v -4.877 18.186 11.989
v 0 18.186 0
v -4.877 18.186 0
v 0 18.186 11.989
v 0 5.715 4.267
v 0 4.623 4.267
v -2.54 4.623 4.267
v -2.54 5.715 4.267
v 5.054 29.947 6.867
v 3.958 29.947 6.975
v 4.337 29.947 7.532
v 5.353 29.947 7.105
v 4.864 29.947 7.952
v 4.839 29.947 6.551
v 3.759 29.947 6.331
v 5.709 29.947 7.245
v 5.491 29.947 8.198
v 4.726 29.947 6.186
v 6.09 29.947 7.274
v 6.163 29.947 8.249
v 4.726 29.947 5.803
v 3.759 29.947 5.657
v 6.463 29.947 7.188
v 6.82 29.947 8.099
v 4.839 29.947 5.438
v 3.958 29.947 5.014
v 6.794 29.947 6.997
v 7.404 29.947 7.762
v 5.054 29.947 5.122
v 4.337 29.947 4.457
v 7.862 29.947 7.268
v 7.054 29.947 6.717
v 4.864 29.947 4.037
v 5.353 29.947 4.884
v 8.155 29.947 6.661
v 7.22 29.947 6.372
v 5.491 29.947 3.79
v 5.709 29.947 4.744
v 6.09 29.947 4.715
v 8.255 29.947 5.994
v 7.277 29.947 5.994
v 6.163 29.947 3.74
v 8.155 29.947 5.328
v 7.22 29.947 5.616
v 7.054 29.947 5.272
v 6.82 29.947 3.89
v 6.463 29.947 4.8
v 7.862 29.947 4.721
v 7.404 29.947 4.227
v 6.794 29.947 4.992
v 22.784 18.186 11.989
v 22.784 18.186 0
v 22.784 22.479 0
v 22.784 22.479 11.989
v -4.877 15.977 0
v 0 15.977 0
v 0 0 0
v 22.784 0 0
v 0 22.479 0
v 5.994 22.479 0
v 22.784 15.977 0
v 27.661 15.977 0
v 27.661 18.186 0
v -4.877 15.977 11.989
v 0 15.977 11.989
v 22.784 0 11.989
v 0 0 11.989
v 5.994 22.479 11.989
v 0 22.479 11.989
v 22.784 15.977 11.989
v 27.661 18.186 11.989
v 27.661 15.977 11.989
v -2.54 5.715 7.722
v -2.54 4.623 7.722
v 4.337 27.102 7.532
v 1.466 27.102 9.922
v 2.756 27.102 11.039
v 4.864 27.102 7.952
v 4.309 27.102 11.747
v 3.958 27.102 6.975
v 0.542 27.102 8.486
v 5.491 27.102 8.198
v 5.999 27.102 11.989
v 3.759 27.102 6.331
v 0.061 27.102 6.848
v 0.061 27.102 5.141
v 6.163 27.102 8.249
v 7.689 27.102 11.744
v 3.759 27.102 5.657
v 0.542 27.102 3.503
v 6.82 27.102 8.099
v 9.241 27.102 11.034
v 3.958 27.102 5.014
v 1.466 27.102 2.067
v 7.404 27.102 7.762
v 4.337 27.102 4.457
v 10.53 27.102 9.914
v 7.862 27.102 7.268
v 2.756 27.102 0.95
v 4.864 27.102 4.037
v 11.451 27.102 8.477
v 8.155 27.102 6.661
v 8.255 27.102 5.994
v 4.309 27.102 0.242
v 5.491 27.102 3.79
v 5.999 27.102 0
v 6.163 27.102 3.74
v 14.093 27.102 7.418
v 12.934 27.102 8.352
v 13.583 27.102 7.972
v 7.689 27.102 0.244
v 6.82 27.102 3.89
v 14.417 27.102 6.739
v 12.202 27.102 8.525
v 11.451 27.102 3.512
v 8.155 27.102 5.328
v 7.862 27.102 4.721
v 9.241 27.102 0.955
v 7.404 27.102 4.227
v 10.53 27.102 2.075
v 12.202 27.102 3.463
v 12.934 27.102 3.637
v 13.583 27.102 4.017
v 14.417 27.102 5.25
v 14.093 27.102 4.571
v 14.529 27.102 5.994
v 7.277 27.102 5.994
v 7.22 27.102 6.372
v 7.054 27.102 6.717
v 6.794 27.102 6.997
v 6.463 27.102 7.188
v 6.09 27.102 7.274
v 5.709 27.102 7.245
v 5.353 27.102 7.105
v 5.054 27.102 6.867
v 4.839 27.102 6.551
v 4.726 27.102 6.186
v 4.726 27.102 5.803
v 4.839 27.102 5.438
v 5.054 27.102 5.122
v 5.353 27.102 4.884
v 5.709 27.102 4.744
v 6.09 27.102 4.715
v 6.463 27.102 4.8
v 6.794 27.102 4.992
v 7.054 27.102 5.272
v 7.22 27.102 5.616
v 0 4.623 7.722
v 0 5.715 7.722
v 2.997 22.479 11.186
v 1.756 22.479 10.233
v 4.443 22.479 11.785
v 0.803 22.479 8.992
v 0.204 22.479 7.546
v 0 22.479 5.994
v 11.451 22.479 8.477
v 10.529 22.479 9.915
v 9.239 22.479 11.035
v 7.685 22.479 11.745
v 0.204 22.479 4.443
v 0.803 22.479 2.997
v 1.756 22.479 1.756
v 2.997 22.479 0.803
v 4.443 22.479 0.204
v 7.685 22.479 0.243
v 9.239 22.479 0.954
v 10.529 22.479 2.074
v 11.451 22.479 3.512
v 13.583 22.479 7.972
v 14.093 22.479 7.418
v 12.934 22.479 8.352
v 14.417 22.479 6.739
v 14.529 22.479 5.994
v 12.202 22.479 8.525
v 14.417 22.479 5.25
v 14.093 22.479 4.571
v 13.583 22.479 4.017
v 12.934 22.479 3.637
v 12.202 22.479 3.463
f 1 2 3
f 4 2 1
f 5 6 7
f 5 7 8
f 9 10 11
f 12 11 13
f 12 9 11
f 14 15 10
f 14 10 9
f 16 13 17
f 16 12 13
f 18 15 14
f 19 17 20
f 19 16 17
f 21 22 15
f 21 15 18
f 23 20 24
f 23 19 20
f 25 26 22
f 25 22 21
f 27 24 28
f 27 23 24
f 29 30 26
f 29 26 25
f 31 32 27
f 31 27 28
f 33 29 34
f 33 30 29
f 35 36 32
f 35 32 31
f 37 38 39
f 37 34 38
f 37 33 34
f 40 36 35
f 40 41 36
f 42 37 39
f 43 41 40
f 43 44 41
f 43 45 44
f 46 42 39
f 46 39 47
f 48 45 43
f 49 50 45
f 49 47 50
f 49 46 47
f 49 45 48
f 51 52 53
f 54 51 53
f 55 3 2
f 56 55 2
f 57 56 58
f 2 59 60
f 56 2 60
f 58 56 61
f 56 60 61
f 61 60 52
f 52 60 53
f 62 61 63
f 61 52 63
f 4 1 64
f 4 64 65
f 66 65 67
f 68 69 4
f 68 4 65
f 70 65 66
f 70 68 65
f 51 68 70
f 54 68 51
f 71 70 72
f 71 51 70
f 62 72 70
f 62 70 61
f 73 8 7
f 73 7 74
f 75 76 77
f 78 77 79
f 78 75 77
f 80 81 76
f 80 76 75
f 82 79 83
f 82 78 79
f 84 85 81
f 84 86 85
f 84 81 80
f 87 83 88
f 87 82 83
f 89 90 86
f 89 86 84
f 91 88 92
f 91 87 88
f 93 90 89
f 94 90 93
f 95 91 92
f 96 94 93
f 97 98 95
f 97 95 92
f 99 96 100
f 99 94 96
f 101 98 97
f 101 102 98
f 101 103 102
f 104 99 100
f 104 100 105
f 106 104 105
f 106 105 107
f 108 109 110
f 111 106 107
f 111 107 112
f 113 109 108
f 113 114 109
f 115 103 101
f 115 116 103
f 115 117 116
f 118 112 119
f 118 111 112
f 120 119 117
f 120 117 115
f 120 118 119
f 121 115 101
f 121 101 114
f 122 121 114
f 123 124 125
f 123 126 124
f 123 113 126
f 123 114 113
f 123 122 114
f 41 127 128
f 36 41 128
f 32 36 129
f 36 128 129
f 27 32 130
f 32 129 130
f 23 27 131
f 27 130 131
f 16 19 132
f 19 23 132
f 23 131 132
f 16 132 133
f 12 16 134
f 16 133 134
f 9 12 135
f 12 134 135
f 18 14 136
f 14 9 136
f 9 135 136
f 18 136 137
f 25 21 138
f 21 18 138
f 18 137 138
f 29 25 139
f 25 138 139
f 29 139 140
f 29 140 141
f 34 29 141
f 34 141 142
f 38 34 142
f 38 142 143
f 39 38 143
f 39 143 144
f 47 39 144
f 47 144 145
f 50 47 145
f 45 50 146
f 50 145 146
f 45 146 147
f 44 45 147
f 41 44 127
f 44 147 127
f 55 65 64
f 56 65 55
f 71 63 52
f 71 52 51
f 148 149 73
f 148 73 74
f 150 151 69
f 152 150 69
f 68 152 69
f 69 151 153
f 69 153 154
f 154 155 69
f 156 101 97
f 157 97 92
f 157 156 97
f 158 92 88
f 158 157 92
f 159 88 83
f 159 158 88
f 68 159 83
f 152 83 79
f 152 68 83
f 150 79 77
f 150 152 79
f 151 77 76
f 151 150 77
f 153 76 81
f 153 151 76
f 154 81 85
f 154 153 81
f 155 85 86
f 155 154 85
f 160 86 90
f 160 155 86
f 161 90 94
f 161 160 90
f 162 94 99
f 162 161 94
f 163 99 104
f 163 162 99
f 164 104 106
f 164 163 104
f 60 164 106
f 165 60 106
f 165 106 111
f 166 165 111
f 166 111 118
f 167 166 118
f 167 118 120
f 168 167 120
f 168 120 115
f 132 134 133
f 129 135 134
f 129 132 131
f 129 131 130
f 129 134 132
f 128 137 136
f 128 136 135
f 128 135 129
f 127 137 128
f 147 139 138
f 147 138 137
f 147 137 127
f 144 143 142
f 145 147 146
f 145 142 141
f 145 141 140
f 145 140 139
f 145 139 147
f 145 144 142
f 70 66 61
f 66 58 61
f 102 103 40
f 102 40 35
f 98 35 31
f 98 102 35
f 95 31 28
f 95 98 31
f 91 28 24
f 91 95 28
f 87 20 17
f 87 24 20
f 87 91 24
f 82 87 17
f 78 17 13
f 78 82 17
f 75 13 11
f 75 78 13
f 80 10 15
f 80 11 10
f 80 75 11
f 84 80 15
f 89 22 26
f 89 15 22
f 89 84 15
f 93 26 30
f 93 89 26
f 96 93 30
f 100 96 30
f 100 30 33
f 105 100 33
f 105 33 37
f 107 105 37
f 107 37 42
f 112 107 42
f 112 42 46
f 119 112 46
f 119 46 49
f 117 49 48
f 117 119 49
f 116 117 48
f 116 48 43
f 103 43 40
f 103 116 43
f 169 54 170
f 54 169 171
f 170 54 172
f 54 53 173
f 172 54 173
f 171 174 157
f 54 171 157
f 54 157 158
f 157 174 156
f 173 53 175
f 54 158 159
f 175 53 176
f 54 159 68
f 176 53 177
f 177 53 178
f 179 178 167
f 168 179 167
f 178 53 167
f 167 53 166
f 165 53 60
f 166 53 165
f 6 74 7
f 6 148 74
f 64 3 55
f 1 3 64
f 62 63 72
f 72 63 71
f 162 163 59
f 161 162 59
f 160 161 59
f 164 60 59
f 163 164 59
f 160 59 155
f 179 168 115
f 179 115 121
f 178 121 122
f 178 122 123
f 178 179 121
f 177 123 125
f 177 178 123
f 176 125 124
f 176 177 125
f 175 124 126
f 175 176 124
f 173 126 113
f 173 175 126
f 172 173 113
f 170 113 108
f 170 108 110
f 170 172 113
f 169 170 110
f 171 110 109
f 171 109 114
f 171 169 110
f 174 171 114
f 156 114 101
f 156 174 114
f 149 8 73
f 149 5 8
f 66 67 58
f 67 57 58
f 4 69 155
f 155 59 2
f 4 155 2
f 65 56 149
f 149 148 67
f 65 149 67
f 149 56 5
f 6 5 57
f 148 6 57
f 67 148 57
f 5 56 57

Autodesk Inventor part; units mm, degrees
ref_plane "YZ Plane" through (0, 0, 0) normal (1, 0, 0) x (0, 1, 0)
ref_plane "XZ Plane" through (0, 0, 0) normal (0, 1, 0) x (-1, 0, 0)
ref_plane "XY Plane" through (0, 0, 0) normal (0, 0, 1) x (1, 0, 0)
sketch "Sketch1" plane through (0, 0, 0) normal (0, 0, 1) x (1, 0, 0)
  line L0 (0, 0) -> (22.7838, 0)
  line L1 (22.7838, 0) -> (22.7838, 22.479)
  line L2 (22.7838, 22.479) -> (0, 22.479)
  line L3 (0, 22.479) -> (0, 0)
  dimension "d0" = 22.7838
  dimension "d1" = 22.479
extrude "Extrusion1" add sketch "Sketch1" along normal blind 11.9888
sketch "Sketch2" plane through (0, 0, 0) normal (-1, 0, 0) x (0, 0, 1)
  line L0 (0, 22.479) -> (11.9888, 22.479) projected
  line L1 (0, 22.479) -> (0, 0) projected
  line L2 (0, 0) -> (11.9888, 0) projected
  line L3 (11.9888, 22.479) -> (11.9888, 0) projected
  line L4 (0, 22.479) -> (11.9888, 22.479) projected
  line L5 (0, 0) -> (0, 22.479) projected
  line L6 (11.9888, 0) -> (11.9888, 22.479) projected
  line L7 (0, 18.1864) -> (11.9888, 18.1864)
  line L8 (11.9888, 18.1864) -> (11.9888, 15.9766)
  line L9 (11.9888, 15.9766) -> (0, 15.9766)
  line L10 (0, 15.9766) -> (0, 18.1864)
  dimension "d4" = 2.2098
  dimension "d5" = 4.2926
extrude "Extrusion2" add sketch "Sketch2" along normal blind 4.8768 and the other way blind 27.6606 contours L7 L3 L9 L1
sketch "Sketch3" plane through (0, 0, 0) normal (-1, 0, 0) x (0, 0, 1)
  line L0 (0, 15.9766) -> (0, 0) projected
  line L1 (0, 0) -> (11.9888, 0) projected
  line L2 (4.2672, 5.715) -> (7.7216, 5.715)
  line L3 (7.7216, 5.715) -> (7.7216, 4.6228)
  line L4 (7.7216, 4.6228) -> (4.2672, 4.6228)
  line L5 (4.2672, 4.6228) -> (4.2672, 5.715)
  dimension "d10" = 3.4544
  dimension "d11" = 1.0922
  dimension "d12" = 4.6228
  dimension "d13" = 4.2672
extrude "Extrusion3" add sketch "Sketch3" along normal blind 2.54
sketch "Sketch4" plane through (0, 22.479, 0) normal (0, 1, 0) x (1, 0, 0)
  line L0 (22.7838, 0) -> (0, 0) projected
  line L1 (0, 0) -> (0, -11.9888) projected
  line L2 (22.7838, -11.9888) -> (0, -11.9888) projected
  circle A0 centre (5.9944, -5.9944) radius 5.9944
  circle A1 centre (11.9888, -5.9944) radius 2.54
  dimension "d17" = 5.08
extrude "Extrusion4" add sketch "Sketch4" along normal blind 4.6228 contours A0 A1 | A1 A0 | A0 A1
sketch "Sketch5" plane through (0, 27.1018, 0) normal (0, 1, 0) x (1, 0, 0)
  arc A0 (11.4507, -3.5121) -> (11.4507, -8.4767) centre (5.9944, -5.9944) ccw projected
  circle A1 centre (5.9944, -5.9944) radius 2.2606
  circle A2 centre (5.9944, -5.9944) radius 1.2827
  point P0 (0, 0)
  dimension "d20" = 4.5212
  dimension "d21" = 2.5654
extrude "Extrusion5" add sketch "Sketch5" along normal blind 2.8448
properties part number "servo body"
